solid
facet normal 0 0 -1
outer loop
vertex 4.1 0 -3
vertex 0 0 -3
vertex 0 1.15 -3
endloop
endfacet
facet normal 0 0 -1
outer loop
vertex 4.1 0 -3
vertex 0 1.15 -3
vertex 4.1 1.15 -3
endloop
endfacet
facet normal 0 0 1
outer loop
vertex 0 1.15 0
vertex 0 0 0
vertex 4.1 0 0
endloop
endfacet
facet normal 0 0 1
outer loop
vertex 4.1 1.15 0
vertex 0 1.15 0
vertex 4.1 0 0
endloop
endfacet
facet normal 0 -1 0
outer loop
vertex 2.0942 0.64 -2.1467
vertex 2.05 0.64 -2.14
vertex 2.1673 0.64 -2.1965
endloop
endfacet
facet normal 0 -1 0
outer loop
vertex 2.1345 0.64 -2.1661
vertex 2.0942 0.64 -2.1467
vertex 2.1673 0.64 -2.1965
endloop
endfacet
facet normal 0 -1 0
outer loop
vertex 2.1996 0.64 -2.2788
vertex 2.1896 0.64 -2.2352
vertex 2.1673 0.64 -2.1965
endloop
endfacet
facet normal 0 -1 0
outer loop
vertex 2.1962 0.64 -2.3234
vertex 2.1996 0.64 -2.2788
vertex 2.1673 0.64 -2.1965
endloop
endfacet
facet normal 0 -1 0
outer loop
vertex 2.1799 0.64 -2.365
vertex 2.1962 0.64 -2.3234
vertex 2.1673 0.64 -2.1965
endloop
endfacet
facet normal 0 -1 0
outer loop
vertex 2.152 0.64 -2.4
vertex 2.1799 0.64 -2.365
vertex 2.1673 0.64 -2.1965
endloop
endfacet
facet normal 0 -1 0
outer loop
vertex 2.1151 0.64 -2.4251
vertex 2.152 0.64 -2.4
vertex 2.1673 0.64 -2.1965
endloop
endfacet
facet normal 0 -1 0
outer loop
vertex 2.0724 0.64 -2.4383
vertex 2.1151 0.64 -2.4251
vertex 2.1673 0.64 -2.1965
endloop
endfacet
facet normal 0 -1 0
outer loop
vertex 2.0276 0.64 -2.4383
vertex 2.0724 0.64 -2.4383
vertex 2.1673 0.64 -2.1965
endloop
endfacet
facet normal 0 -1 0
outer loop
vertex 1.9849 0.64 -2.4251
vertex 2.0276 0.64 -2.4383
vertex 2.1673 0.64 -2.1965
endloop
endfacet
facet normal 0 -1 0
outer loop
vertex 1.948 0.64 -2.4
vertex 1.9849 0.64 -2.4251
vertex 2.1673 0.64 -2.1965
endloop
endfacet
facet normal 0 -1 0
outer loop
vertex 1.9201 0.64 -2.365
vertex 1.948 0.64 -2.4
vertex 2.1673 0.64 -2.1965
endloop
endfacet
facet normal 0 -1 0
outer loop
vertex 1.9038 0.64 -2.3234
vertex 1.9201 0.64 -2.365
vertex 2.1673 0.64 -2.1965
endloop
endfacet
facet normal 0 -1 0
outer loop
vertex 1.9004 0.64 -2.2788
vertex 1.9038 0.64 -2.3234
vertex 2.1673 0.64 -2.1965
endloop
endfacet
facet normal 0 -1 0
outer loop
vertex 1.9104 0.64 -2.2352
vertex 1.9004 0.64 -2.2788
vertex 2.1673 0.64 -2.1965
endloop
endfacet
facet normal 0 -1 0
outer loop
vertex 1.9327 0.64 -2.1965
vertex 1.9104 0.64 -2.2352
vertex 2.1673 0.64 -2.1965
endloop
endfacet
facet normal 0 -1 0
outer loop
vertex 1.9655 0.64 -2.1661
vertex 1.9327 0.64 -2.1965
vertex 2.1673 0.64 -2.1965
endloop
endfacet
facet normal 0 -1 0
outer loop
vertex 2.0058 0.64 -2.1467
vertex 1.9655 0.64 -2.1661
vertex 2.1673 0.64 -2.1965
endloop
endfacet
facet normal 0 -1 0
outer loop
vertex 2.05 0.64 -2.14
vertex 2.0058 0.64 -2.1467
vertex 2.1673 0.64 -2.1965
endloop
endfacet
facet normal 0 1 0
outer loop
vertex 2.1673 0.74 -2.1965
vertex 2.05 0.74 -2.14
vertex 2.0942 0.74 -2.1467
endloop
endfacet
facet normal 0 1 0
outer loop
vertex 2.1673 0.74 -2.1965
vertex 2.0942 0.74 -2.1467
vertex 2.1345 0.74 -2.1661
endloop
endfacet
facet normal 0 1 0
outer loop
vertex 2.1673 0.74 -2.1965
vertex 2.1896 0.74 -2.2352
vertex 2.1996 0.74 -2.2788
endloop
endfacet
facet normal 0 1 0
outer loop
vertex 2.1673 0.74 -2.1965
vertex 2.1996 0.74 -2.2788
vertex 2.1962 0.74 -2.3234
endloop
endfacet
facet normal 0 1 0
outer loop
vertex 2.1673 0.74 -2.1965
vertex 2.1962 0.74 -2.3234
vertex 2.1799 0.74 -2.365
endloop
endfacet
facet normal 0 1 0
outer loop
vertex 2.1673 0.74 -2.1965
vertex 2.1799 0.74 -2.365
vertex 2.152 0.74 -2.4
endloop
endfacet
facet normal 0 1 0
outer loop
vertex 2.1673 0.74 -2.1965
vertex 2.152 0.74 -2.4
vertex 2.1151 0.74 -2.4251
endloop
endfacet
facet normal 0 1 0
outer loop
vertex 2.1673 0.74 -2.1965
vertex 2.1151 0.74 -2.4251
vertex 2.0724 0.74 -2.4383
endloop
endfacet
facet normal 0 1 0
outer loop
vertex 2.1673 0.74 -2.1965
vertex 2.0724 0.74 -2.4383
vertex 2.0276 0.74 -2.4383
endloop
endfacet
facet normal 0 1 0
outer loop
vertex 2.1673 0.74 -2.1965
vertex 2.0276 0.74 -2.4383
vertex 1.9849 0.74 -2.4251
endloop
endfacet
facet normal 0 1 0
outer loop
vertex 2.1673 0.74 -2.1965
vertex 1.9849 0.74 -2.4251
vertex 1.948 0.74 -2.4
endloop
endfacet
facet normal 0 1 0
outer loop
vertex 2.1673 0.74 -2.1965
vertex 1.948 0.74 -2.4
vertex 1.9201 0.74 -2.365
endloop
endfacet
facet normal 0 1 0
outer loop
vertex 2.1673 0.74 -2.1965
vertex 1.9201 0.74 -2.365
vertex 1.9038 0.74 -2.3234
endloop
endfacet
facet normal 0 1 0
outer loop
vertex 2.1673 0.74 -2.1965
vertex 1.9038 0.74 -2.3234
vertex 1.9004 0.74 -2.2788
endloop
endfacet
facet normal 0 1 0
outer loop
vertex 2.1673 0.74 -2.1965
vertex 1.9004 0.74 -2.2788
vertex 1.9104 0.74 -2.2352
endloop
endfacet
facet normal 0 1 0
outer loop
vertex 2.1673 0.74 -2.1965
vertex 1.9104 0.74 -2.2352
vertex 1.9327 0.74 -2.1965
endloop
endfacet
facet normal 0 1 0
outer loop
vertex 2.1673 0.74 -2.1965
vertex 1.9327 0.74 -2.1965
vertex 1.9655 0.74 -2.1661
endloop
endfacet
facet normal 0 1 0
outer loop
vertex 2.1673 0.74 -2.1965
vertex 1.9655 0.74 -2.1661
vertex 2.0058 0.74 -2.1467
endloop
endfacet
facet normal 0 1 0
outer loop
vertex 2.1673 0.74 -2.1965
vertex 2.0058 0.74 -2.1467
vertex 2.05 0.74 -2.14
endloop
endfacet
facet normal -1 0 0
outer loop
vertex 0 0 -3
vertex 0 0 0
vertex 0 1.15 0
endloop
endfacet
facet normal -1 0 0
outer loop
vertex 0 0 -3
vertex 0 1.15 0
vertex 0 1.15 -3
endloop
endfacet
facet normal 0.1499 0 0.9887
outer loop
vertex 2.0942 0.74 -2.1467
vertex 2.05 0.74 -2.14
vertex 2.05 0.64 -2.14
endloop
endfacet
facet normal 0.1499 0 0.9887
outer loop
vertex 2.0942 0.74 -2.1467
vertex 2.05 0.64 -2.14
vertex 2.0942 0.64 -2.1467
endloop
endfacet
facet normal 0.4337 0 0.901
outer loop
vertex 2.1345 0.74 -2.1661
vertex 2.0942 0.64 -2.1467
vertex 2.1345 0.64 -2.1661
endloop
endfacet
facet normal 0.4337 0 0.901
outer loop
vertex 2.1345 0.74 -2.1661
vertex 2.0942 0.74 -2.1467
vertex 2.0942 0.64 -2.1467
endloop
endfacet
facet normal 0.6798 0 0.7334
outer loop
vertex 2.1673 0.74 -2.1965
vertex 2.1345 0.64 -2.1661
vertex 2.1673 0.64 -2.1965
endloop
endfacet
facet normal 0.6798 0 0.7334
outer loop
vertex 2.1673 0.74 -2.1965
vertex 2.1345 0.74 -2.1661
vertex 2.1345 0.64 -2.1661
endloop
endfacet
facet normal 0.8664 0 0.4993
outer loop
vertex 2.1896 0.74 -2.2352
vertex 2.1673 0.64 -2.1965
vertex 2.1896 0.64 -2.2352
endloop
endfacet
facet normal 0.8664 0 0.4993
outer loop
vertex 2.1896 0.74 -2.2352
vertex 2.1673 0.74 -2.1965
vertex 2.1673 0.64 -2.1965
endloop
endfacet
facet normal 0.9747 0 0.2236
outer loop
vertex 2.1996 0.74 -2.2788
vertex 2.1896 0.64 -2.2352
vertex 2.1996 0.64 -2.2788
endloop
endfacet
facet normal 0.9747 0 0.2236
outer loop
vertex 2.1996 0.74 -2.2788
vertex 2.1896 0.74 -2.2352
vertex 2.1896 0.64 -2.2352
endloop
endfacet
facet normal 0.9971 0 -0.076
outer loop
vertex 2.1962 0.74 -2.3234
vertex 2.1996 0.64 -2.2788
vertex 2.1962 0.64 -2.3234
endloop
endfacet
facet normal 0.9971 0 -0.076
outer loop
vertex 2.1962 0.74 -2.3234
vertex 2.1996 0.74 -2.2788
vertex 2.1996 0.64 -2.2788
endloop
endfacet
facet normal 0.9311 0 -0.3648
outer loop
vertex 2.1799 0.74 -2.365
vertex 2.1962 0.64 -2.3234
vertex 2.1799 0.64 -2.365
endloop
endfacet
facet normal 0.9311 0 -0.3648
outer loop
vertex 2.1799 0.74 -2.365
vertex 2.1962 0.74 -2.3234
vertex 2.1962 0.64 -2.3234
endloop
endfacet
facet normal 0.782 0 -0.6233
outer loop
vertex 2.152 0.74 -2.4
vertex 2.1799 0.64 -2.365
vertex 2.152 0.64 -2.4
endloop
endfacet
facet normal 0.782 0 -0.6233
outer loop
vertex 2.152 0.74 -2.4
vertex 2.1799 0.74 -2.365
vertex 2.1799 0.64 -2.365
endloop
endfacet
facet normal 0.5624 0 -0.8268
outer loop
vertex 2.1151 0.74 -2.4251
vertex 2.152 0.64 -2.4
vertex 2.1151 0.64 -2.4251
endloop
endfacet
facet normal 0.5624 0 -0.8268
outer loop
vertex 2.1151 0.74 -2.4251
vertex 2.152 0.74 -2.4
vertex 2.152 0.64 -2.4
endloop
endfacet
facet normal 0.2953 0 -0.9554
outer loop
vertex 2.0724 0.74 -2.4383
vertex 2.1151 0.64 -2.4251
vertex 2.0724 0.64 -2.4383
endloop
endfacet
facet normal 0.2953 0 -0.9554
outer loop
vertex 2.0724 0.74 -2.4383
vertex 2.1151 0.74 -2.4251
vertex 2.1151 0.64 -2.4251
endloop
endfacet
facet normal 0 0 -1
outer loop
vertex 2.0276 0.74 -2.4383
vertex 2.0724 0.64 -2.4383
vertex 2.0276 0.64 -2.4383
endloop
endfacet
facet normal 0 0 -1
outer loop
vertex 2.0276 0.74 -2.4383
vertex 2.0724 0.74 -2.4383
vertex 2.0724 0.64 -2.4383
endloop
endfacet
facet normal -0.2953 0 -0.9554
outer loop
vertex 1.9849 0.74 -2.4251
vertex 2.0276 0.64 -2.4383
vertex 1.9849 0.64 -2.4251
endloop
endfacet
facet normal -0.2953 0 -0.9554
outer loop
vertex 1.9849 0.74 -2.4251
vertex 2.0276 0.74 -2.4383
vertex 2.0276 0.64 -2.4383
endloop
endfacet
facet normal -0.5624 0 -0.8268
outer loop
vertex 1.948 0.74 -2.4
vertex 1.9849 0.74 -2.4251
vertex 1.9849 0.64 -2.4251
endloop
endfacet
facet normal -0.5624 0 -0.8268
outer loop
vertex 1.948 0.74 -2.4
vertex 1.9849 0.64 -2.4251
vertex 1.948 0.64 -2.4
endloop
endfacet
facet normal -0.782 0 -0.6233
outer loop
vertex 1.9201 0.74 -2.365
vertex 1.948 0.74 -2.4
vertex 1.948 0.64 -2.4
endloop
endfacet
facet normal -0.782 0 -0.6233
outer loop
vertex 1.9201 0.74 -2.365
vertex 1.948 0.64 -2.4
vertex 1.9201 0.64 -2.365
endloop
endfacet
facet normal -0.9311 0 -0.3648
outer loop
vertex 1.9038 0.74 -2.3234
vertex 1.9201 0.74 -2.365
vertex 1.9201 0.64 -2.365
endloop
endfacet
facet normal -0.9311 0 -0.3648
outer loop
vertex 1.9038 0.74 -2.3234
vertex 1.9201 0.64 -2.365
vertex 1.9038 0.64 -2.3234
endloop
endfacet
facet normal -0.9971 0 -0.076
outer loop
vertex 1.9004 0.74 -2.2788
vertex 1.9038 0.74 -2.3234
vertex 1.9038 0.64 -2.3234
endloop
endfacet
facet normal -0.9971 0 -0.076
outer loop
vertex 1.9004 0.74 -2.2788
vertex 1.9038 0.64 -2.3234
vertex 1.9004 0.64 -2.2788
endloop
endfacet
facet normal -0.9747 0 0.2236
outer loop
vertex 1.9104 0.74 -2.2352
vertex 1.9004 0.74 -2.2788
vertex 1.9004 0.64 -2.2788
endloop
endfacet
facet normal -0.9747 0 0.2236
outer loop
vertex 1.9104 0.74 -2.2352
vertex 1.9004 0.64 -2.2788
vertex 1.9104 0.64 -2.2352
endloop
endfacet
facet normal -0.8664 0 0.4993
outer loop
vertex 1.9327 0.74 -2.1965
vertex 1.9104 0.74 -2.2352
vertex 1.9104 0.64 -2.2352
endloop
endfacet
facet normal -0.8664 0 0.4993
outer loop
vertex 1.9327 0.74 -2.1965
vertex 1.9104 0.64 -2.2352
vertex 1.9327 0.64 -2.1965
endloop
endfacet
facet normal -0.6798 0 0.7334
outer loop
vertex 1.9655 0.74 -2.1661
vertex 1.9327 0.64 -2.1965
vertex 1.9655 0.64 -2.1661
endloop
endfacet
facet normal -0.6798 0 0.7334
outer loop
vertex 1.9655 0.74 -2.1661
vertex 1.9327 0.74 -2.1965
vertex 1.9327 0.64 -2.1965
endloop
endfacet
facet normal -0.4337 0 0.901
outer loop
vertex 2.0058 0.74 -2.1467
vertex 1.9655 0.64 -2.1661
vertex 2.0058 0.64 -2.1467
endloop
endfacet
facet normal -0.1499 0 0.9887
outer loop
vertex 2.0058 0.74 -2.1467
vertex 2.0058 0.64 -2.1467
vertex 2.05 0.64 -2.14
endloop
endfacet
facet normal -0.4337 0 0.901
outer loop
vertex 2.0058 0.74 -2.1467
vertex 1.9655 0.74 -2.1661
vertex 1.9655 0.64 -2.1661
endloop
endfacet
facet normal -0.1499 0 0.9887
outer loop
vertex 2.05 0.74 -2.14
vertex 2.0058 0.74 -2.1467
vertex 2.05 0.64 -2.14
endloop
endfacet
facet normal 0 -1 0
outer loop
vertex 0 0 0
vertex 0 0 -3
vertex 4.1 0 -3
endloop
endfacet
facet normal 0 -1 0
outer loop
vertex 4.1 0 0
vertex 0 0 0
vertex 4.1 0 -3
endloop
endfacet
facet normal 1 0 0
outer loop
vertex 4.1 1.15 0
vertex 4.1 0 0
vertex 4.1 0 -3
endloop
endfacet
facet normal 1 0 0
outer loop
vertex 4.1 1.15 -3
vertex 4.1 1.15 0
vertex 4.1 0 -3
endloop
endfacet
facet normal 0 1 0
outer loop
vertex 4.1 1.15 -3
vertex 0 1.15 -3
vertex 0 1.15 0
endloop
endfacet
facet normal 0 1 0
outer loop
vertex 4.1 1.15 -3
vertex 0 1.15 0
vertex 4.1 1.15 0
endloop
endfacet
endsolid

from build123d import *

# Parameters (mm, degrees)
SKETCH1_W           = 4.1
SKETCH1_H           = 3
BOSS_EXTRUDE1_DEPTH = 1.15
SKETCH2_R           = 0.15
BOSS_EXTRUDE2_DEPTH = 0.1


with BuildPart() as part:
    # Sketch1 → Boss-Extrude1 (new body)
    with BuildSketch(Plane(origin=(0, 0, 0), x_dir=(1, 0, 0), z_dir=(0, 1, 0))):
        with Locations((2.05, 1.5)):
            Rectangle(SKETCH1_W, SKETCH1_H)
    extrude(amount=BOSS_EXTRUDE1_DEPTH)


with BuildPart() as body_2:
    # Sketch2 → Boss-Extrude2 (new body)
    with BuildSketch(Plane(origin=(0, 0.74, 0), x_dir=(1, 0, 0), z_dir=(0, 1, 0))):
        with Locations(Location((2.05, 2.29, 0), (0, 0, 270))):
            Circle(SKETCH2_R)
    extrude(amount=-BOSS_EXTRUDE2_DEPTH)


solid = Compound([part.part, body_2.part])
